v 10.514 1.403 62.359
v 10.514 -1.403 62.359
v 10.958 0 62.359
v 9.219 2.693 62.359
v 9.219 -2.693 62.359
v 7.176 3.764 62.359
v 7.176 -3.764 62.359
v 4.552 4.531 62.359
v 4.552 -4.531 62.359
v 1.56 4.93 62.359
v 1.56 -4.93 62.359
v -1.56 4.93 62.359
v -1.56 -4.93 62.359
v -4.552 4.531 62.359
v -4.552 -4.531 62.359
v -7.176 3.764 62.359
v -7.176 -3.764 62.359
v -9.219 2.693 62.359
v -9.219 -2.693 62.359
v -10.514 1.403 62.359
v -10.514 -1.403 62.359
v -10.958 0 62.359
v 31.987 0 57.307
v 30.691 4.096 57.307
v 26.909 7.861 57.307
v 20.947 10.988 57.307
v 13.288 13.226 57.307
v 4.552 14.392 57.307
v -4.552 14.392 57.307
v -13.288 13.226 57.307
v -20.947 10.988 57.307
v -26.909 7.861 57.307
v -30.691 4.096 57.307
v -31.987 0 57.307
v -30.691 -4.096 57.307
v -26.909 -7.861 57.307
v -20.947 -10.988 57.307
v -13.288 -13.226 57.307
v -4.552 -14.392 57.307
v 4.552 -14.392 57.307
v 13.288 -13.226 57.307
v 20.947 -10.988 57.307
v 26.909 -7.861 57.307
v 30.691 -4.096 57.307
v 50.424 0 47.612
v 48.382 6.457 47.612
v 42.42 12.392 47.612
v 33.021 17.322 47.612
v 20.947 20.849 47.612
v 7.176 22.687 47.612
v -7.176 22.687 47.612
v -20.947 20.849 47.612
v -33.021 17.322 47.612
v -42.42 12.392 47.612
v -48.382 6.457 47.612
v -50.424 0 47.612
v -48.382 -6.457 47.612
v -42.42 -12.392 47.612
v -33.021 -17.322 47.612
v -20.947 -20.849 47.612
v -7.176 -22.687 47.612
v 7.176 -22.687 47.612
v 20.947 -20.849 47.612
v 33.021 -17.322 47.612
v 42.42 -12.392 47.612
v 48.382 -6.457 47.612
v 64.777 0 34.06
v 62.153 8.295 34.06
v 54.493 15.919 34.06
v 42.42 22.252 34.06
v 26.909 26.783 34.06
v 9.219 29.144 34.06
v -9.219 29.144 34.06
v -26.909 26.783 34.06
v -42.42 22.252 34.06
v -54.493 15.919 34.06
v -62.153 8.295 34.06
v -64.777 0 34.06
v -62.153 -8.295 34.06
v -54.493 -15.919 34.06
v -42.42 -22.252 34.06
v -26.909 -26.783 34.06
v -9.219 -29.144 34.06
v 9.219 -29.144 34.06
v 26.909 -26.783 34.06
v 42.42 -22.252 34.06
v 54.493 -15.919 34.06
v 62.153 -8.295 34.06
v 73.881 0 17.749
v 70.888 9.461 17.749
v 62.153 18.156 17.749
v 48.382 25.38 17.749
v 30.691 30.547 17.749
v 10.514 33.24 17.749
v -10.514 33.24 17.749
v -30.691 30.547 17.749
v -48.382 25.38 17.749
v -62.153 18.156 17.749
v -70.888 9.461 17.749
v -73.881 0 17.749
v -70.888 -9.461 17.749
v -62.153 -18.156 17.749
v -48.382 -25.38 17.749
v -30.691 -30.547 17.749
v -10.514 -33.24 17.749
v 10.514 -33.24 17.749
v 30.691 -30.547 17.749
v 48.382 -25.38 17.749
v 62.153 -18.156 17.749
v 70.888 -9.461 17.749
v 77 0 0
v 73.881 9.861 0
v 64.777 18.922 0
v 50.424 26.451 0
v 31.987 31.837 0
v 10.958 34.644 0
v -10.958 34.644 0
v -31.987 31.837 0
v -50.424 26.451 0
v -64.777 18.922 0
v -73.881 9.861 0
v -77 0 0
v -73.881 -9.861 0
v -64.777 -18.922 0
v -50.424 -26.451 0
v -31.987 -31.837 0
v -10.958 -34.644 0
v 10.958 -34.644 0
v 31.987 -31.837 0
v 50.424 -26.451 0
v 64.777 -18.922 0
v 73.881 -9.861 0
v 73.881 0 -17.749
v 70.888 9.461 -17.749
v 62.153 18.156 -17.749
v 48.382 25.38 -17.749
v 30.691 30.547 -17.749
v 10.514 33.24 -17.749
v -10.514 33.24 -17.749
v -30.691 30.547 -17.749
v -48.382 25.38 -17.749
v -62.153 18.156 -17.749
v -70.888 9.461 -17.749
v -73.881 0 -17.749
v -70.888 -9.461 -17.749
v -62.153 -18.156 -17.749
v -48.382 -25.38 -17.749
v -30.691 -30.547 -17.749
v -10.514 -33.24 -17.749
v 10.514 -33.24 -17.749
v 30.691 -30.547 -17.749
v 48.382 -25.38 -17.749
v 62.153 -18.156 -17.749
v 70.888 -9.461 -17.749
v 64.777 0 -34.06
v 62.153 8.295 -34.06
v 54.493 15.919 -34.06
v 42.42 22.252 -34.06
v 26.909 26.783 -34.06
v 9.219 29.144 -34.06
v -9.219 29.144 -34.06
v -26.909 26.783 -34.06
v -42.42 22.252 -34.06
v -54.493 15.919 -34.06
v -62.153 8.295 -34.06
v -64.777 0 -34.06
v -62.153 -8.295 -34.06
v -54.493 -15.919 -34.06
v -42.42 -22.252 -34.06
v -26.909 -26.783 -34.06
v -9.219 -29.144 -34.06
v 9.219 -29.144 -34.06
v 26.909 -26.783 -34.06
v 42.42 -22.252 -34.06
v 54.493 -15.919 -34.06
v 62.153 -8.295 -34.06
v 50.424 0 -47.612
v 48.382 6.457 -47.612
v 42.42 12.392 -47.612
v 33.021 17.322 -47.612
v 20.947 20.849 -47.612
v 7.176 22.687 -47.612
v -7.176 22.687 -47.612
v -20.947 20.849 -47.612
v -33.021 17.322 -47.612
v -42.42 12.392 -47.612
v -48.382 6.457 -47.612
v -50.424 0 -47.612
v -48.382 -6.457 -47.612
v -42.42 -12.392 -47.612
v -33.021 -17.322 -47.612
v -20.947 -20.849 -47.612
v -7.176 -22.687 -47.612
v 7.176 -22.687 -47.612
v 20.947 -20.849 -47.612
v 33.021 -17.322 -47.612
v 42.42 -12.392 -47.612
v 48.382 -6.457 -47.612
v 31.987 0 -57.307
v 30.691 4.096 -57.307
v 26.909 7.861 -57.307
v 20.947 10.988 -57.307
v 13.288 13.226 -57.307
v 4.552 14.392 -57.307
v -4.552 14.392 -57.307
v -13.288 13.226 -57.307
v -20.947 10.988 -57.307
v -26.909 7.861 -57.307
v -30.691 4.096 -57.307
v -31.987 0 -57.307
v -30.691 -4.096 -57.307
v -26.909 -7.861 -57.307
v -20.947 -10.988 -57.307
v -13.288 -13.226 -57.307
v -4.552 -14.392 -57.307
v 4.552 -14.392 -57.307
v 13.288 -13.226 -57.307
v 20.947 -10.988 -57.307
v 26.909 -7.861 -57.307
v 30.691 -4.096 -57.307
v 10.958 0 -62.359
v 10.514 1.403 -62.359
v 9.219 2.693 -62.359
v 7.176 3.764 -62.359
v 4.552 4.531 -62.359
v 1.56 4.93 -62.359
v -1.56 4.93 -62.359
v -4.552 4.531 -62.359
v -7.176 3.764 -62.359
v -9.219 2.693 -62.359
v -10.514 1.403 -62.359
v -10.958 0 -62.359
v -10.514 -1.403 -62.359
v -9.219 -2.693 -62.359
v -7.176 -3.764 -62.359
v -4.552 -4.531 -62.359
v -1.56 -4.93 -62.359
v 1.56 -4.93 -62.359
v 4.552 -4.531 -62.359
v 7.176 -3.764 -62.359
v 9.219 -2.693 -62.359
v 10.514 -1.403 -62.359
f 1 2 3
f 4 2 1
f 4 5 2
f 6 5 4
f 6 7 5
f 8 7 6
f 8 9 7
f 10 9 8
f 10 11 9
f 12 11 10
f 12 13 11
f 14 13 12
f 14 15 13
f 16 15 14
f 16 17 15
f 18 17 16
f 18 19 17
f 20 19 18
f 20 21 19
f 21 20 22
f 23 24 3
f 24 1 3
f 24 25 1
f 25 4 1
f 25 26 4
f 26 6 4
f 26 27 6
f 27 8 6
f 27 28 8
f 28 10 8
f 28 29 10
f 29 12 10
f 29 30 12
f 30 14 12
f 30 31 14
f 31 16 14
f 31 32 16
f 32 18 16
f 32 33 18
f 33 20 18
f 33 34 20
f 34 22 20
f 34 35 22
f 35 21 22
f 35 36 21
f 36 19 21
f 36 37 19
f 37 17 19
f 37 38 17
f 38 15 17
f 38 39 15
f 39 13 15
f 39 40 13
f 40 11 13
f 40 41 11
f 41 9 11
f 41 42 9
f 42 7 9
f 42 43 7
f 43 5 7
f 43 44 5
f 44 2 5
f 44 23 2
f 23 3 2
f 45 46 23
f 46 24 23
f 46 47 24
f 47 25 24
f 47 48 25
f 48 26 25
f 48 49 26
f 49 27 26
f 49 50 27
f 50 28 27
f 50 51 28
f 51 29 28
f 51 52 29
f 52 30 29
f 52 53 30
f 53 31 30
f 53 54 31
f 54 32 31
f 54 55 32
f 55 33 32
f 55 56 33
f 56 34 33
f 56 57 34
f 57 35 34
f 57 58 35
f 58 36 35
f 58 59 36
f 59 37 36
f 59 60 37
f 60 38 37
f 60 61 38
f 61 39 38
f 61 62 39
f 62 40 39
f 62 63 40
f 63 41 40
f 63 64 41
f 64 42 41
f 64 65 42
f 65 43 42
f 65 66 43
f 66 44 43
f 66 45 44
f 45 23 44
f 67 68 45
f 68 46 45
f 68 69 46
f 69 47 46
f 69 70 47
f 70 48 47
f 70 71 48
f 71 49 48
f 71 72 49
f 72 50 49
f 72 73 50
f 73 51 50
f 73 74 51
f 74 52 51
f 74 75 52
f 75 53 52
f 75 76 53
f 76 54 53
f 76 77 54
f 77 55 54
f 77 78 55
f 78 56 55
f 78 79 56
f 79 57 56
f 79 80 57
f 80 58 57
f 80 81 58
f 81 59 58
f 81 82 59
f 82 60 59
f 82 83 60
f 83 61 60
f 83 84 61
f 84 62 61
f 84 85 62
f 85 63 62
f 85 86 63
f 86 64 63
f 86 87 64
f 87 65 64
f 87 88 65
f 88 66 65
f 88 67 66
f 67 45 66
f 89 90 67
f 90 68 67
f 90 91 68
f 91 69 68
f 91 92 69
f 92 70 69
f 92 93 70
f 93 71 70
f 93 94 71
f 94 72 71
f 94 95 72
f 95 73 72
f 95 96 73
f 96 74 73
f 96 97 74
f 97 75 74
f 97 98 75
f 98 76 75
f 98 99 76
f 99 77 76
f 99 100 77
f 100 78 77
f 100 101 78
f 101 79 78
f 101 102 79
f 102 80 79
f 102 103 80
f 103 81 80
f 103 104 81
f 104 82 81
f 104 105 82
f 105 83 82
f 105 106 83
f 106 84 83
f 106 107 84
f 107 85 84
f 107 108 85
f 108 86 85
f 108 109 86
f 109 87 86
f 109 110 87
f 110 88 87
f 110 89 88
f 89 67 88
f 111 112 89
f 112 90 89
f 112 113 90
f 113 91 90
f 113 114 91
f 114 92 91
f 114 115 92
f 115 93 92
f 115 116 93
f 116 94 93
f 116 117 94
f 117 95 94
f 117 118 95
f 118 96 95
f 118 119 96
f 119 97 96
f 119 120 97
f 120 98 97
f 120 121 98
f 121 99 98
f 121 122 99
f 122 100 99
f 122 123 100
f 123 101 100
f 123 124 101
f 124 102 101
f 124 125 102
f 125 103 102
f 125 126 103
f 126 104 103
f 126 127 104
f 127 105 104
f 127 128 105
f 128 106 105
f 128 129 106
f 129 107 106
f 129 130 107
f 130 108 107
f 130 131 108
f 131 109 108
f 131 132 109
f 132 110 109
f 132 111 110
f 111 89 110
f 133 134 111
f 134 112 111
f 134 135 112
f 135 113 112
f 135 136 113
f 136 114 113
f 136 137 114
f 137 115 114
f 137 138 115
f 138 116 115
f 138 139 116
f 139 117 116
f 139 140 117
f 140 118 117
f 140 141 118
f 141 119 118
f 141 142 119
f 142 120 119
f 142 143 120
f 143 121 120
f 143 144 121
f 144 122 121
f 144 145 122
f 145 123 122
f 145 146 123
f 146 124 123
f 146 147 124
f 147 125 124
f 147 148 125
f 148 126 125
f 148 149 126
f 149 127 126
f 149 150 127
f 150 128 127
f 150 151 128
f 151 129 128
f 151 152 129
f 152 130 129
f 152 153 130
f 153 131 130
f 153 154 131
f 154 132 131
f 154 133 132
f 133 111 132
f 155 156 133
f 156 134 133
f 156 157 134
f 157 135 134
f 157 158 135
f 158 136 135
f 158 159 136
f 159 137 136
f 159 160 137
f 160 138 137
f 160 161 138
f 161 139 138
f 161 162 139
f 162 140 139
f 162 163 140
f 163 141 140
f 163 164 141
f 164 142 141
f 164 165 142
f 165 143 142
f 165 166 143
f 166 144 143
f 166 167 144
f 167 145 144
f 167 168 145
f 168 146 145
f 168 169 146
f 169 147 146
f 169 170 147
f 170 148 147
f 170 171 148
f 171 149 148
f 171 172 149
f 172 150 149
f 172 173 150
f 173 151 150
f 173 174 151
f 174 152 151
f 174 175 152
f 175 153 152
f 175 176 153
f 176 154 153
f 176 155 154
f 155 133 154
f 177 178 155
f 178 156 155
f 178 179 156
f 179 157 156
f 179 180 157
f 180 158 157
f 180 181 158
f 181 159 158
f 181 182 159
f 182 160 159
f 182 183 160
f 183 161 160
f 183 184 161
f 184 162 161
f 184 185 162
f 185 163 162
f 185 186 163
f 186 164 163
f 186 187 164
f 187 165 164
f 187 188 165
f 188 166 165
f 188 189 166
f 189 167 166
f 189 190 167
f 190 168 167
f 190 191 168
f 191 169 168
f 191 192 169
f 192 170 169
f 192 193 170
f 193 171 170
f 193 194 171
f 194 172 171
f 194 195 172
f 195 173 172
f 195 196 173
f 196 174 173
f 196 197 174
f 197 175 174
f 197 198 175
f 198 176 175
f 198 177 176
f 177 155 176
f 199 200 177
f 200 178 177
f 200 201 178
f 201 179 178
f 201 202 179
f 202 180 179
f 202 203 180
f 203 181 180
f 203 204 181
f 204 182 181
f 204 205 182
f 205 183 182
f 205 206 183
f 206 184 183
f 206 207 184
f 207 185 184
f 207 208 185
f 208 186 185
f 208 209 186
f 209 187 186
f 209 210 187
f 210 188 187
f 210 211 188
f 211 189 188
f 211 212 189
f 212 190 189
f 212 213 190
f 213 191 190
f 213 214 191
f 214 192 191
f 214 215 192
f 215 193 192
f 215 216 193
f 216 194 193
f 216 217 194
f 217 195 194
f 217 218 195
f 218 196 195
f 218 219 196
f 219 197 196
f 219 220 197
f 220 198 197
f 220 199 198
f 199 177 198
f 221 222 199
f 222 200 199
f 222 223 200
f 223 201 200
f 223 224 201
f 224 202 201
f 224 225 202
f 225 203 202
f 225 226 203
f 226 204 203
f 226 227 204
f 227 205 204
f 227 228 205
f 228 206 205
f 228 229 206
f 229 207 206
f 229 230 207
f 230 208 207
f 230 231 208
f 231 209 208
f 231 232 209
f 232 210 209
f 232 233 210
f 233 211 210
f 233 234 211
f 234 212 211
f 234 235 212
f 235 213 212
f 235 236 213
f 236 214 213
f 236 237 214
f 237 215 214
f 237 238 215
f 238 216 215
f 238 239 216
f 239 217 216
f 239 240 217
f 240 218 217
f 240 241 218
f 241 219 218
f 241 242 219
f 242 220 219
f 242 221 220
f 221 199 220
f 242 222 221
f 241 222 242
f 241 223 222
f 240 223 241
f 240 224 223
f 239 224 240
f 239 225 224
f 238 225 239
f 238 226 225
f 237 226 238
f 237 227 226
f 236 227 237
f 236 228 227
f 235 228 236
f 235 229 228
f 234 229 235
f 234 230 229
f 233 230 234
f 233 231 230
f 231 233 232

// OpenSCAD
// Generated by SolidPython 1.0.1 on 2020-07-29 00:46:49


scale(v = [11, 5, 9]) {
	sphere(r = 7);
}
/***********************************************
*********      SolidPython code:      **********
************************************************
 
# import packages: SolidPython
from solid import *
from solid.utils import *
from itertools import chain, combinations, permutations


class Resize:

    def __init__(self, scad_file):
        self.scad_file = scad_file
        #self.scad_file = import_scad(scad_file)
        # cone/cylinder param:
        self.r1 = 0
        self.r2 = 0
        self.h = 0
        # rectangular prism param:
        self.w = 0
        self.l = 0
        # ellipse param:
        self.r = 0

    # import OpenScad code (file name corresponds to shape)


    # classify shape + parameters
    def assign(self, param1, param2, param3):
        if self.scad_file == 'cone.scad':
            self.r1 = param1
            self.r2 = param2
            self.h = param3
        elif self.scad_file == 'cylinder.scad':
            self.r1 = param1
            self.r2 = param2
            self.h = param3
        elif self.scad_file == 'rectangularPrism.scad':
            self.h = param1
            self.l = param2
            self.w = param3
        else:
            self.r = param1
            self.h = param2

    # resize parameters
    def iterate(self):
        x = range(3, 20, 2)
        i = 1
        if self.scad_file == 'cone.scad':
            tempList = list(permutations(x, 2))
            for temp in tempList:
                param1 = temp[0]
                param2 = temp[1]
                filepath = 'produced_scad_files/' + 'cone' + str(param1) + '_' + str(param2) + '_' + '.scad'
                scad_render_to_file(cylinder(h=param1, r1=param2, r2=0), filepath)

        elif self.scad_file == 'cylinder.scad':
            tempList = list(permutations(x, 3))
            for temp in tempList:
                param1 = temp[0]
                param2 = temp[1]
                filepath = 'produced_scad_files/' + 'cylinder' + str(param1) + '_' + str(param2) + '_' + '.scad'
                scad_render_to_file(cylinder(h=param1, r1=param2, r2=param2), filepath)

        elif self.scad_file == 'rectangularPrism.scad':
            tempList = list(permutations(x, 3))
            for temp in tempList:
                param1 = temp[0]
                param2 = temp[1]
                param3 = temp[2]
                filepath = 'produced_scad_files/' + 'rectangularPrism' + str(param1) + '_' + str(param2) + '_' + str(
                    param3) + '.scad'
                scad_render_to_file(cube(size=(param1, param2, param3)), filepath)

        elif self.scad_file == 'ellipse.scad':
            tempList = list(permutations(x, 4))
            for temp in tempList:
                param1 = temp[0]
                param2 = temp[1]
                param3 = temp[2]
                param4 = temp[3]
                filepath = 'produced_scad_files/' + 'ellipse' + str(param1) + '_' + str(param2) + '_' + str(param3) + '_' + str(param4) + '.scad'
                scad_render_to_file(scale([param1, param2, param3])(sphere(r=param4)), filepath)

    def render_to_scadfile(self):
        scad_render_to_file(scad, 'example.scad') 
 
************************************************/
